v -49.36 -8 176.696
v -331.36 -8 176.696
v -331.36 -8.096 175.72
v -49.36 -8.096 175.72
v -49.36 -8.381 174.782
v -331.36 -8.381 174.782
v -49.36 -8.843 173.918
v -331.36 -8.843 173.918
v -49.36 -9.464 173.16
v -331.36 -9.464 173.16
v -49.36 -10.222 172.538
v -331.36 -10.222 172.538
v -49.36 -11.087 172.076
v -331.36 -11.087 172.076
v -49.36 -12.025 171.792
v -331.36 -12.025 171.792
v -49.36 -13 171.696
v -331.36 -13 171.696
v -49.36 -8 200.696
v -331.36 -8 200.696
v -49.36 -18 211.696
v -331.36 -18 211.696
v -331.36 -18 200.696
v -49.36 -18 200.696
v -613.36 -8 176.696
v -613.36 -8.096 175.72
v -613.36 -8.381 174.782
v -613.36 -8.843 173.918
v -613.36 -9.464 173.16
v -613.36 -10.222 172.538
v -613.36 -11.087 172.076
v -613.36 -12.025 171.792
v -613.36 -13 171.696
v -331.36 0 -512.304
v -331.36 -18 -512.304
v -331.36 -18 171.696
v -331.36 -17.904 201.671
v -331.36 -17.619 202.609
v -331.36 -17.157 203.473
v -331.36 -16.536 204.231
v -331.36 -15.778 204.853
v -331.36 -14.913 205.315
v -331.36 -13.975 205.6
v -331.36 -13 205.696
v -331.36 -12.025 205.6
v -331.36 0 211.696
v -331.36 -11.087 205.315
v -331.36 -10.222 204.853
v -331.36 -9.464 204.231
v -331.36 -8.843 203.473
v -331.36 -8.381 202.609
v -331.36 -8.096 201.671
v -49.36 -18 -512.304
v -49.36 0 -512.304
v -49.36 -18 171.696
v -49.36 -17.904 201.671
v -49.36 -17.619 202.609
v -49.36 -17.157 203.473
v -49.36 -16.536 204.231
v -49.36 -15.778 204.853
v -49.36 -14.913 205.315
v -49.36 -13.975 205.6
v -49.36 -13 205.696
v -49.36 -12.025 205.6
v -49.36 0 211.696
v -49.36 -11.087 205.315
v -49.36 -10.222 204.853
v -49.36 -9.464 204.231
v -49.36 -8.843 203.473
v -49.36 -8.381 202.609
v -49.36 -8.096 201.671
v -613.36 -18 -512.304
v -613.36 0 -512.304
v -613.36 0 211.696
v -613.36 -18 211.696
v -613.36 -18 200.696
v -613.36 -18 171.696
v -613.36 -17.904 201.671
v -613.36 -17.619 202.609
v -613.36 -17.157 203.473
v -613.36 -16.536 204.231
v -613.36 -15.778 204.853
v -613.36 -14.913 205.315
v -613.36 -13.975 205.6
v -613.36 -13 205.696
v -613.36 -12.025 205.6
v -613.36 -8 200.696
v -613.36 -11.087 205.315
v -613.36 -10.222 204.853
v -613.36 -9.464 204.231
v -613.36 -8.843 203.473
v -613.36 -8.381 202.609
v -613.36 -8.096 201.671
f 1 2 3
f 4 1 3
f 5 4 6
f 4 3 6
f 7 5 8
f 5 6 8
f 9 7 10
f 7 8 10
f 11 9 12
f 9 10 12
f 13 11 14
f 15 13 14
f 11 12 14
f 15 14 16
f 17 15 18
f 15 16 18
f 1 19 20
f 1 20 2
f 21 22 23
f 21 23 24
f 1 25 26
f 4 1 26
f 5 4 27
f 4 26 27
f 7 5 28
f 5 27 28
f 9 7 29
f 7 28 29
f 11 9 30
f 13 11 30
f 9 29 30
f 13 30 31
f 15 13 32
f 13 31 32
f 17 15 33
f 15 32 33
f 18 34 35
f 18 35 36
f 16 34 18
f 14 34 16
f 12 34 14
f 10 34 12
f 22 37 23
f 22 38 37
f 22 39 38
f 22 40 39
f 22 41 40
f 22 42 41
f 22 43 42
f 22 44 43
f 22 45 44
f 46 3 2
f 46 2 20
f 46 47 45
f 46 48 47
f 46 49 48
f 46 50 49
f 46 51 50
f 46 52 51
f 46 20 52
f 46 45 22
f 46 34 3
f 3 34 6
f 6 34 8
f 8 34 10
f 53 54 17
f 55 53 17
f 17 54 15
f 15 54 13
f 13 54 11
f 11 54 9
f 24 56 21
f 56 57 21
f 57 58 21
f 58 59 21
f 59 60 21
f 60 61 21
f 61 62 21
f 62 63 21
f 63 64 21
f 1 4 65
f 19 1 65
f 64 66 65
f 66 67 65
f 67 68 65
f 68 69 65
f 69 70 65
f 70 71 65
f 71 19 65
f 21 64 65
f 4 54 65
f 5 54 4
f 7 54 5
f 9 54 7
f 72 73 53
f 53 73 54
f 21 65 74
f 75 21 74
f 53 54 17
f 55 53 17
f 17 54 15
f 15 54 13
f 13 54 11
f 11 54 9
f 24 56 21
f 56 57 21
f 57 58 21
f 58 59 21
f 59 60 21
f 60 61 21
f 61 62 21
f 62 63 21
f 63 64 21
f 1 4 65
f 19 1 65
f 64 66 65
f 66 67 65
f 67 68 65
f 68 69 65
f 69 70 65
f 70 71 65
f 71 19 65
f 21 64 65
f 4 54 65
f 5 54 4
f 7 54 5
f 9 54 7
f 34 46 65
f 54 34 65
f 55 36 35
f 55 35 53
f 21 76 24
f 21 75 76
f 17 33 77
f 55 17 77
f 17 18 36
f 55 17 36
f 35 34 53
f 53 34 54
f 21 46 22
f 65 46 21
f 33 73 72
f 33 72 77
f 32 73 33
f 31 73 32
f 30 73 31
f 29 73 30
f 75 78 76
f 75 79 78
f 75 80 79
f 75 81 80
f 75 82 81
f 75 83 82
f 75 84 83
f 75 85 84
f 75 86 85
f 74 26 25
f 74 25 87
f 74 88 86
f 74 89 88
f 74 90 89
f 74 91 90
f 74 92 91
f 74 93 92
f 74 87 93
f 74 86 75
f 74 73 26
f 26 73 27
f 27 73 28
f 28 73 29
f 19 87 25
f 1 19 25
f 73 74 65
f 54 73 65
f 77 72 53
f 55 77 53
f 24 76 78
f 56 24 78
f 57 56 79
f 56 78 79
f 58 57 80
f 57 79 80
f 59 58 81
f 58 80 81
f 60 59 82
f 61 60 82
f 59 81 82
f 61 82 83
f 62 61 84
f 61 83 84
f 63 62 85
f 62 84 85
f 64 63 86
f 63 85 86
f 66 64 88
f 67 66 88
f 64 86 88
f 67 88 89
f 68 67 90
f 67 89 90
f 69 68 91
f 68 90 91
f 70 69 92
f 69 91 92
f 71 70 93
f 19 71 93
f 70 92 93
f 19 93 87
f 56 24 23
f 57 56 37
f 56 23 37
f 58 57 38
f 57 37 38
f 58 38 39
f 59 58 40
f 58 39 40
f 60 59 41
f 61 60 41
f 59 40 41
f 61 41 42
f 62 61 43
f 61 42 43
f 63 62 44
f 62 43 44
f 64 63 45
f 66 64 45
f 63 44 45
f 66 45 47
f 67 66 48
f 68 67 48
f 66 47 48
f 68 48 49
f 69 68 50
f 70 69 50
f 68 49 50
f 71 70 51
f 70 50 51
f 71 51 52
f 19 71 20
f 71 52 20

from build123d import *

# Parameters (mm, degrees)
F0_W     = 282
F0_H     = 724
F1_DEPTH = 18
F2_DEPTH = 18
F4_DEPTH = 661


with BuildPart() as f1:
    # F0 (on Front) → F1 (new body)
    with BuildSketch(Plane.XZ):
        with Locations((-190.360298, -150.304371)):
            Rectangle(F0_W, F0_H)
    extrude(amount=F1_DEPTH)


with BuildPart() as f2:
    # F0 (on Front) → F2 (new body)
    with BuildSketch(Plane.XZ):
        with Locations((-190.360298, -150.304371)):
            Rectangle(F0_W, F0_H)
        with Locations((-472.360298, -150.304371)):
            Rectangle(F0_W, F0_H)
    extrude(amount=F2_DEPTH)


with BuildPart() as f4_tool:
    # F3 (on face) → F4 (new body)
    with BuildSketch(Plane(origin=(-613.360298, 0, 0), x_dir=(0, -1, 0), z_dir=(-1, 0, 0))):
        with BuildLine():
            Line((13, 171.695629), (18, 171.695629))
            Line((18, 171.695629), (18, 200.695629))
            ThreePointArc((18, 200.695629), (13, 205.695629), (8, 200.695629))
            Line((8, 200.695629), (8, 176.695629))
            ThreePointArc((8, 176.695629), (9.464466, 173.160095), (13, 171.695629))
        make_face()
    extrude(amount=-F4_DEPTH)


with BuildPart() as f1_1:
    add(f1.part)

    # F4: cut by f4_tool
    add(f4_tool.part, mode=Mode.SUBTRACT)


with BuildPart() as f2_1:
    add(f2.part)

    # F4: cut by f4_tool
    add(f4_tool.part, mode=Mode.SUBTRACT)


solid = Compound([f1_1.part, f2_1.part])
